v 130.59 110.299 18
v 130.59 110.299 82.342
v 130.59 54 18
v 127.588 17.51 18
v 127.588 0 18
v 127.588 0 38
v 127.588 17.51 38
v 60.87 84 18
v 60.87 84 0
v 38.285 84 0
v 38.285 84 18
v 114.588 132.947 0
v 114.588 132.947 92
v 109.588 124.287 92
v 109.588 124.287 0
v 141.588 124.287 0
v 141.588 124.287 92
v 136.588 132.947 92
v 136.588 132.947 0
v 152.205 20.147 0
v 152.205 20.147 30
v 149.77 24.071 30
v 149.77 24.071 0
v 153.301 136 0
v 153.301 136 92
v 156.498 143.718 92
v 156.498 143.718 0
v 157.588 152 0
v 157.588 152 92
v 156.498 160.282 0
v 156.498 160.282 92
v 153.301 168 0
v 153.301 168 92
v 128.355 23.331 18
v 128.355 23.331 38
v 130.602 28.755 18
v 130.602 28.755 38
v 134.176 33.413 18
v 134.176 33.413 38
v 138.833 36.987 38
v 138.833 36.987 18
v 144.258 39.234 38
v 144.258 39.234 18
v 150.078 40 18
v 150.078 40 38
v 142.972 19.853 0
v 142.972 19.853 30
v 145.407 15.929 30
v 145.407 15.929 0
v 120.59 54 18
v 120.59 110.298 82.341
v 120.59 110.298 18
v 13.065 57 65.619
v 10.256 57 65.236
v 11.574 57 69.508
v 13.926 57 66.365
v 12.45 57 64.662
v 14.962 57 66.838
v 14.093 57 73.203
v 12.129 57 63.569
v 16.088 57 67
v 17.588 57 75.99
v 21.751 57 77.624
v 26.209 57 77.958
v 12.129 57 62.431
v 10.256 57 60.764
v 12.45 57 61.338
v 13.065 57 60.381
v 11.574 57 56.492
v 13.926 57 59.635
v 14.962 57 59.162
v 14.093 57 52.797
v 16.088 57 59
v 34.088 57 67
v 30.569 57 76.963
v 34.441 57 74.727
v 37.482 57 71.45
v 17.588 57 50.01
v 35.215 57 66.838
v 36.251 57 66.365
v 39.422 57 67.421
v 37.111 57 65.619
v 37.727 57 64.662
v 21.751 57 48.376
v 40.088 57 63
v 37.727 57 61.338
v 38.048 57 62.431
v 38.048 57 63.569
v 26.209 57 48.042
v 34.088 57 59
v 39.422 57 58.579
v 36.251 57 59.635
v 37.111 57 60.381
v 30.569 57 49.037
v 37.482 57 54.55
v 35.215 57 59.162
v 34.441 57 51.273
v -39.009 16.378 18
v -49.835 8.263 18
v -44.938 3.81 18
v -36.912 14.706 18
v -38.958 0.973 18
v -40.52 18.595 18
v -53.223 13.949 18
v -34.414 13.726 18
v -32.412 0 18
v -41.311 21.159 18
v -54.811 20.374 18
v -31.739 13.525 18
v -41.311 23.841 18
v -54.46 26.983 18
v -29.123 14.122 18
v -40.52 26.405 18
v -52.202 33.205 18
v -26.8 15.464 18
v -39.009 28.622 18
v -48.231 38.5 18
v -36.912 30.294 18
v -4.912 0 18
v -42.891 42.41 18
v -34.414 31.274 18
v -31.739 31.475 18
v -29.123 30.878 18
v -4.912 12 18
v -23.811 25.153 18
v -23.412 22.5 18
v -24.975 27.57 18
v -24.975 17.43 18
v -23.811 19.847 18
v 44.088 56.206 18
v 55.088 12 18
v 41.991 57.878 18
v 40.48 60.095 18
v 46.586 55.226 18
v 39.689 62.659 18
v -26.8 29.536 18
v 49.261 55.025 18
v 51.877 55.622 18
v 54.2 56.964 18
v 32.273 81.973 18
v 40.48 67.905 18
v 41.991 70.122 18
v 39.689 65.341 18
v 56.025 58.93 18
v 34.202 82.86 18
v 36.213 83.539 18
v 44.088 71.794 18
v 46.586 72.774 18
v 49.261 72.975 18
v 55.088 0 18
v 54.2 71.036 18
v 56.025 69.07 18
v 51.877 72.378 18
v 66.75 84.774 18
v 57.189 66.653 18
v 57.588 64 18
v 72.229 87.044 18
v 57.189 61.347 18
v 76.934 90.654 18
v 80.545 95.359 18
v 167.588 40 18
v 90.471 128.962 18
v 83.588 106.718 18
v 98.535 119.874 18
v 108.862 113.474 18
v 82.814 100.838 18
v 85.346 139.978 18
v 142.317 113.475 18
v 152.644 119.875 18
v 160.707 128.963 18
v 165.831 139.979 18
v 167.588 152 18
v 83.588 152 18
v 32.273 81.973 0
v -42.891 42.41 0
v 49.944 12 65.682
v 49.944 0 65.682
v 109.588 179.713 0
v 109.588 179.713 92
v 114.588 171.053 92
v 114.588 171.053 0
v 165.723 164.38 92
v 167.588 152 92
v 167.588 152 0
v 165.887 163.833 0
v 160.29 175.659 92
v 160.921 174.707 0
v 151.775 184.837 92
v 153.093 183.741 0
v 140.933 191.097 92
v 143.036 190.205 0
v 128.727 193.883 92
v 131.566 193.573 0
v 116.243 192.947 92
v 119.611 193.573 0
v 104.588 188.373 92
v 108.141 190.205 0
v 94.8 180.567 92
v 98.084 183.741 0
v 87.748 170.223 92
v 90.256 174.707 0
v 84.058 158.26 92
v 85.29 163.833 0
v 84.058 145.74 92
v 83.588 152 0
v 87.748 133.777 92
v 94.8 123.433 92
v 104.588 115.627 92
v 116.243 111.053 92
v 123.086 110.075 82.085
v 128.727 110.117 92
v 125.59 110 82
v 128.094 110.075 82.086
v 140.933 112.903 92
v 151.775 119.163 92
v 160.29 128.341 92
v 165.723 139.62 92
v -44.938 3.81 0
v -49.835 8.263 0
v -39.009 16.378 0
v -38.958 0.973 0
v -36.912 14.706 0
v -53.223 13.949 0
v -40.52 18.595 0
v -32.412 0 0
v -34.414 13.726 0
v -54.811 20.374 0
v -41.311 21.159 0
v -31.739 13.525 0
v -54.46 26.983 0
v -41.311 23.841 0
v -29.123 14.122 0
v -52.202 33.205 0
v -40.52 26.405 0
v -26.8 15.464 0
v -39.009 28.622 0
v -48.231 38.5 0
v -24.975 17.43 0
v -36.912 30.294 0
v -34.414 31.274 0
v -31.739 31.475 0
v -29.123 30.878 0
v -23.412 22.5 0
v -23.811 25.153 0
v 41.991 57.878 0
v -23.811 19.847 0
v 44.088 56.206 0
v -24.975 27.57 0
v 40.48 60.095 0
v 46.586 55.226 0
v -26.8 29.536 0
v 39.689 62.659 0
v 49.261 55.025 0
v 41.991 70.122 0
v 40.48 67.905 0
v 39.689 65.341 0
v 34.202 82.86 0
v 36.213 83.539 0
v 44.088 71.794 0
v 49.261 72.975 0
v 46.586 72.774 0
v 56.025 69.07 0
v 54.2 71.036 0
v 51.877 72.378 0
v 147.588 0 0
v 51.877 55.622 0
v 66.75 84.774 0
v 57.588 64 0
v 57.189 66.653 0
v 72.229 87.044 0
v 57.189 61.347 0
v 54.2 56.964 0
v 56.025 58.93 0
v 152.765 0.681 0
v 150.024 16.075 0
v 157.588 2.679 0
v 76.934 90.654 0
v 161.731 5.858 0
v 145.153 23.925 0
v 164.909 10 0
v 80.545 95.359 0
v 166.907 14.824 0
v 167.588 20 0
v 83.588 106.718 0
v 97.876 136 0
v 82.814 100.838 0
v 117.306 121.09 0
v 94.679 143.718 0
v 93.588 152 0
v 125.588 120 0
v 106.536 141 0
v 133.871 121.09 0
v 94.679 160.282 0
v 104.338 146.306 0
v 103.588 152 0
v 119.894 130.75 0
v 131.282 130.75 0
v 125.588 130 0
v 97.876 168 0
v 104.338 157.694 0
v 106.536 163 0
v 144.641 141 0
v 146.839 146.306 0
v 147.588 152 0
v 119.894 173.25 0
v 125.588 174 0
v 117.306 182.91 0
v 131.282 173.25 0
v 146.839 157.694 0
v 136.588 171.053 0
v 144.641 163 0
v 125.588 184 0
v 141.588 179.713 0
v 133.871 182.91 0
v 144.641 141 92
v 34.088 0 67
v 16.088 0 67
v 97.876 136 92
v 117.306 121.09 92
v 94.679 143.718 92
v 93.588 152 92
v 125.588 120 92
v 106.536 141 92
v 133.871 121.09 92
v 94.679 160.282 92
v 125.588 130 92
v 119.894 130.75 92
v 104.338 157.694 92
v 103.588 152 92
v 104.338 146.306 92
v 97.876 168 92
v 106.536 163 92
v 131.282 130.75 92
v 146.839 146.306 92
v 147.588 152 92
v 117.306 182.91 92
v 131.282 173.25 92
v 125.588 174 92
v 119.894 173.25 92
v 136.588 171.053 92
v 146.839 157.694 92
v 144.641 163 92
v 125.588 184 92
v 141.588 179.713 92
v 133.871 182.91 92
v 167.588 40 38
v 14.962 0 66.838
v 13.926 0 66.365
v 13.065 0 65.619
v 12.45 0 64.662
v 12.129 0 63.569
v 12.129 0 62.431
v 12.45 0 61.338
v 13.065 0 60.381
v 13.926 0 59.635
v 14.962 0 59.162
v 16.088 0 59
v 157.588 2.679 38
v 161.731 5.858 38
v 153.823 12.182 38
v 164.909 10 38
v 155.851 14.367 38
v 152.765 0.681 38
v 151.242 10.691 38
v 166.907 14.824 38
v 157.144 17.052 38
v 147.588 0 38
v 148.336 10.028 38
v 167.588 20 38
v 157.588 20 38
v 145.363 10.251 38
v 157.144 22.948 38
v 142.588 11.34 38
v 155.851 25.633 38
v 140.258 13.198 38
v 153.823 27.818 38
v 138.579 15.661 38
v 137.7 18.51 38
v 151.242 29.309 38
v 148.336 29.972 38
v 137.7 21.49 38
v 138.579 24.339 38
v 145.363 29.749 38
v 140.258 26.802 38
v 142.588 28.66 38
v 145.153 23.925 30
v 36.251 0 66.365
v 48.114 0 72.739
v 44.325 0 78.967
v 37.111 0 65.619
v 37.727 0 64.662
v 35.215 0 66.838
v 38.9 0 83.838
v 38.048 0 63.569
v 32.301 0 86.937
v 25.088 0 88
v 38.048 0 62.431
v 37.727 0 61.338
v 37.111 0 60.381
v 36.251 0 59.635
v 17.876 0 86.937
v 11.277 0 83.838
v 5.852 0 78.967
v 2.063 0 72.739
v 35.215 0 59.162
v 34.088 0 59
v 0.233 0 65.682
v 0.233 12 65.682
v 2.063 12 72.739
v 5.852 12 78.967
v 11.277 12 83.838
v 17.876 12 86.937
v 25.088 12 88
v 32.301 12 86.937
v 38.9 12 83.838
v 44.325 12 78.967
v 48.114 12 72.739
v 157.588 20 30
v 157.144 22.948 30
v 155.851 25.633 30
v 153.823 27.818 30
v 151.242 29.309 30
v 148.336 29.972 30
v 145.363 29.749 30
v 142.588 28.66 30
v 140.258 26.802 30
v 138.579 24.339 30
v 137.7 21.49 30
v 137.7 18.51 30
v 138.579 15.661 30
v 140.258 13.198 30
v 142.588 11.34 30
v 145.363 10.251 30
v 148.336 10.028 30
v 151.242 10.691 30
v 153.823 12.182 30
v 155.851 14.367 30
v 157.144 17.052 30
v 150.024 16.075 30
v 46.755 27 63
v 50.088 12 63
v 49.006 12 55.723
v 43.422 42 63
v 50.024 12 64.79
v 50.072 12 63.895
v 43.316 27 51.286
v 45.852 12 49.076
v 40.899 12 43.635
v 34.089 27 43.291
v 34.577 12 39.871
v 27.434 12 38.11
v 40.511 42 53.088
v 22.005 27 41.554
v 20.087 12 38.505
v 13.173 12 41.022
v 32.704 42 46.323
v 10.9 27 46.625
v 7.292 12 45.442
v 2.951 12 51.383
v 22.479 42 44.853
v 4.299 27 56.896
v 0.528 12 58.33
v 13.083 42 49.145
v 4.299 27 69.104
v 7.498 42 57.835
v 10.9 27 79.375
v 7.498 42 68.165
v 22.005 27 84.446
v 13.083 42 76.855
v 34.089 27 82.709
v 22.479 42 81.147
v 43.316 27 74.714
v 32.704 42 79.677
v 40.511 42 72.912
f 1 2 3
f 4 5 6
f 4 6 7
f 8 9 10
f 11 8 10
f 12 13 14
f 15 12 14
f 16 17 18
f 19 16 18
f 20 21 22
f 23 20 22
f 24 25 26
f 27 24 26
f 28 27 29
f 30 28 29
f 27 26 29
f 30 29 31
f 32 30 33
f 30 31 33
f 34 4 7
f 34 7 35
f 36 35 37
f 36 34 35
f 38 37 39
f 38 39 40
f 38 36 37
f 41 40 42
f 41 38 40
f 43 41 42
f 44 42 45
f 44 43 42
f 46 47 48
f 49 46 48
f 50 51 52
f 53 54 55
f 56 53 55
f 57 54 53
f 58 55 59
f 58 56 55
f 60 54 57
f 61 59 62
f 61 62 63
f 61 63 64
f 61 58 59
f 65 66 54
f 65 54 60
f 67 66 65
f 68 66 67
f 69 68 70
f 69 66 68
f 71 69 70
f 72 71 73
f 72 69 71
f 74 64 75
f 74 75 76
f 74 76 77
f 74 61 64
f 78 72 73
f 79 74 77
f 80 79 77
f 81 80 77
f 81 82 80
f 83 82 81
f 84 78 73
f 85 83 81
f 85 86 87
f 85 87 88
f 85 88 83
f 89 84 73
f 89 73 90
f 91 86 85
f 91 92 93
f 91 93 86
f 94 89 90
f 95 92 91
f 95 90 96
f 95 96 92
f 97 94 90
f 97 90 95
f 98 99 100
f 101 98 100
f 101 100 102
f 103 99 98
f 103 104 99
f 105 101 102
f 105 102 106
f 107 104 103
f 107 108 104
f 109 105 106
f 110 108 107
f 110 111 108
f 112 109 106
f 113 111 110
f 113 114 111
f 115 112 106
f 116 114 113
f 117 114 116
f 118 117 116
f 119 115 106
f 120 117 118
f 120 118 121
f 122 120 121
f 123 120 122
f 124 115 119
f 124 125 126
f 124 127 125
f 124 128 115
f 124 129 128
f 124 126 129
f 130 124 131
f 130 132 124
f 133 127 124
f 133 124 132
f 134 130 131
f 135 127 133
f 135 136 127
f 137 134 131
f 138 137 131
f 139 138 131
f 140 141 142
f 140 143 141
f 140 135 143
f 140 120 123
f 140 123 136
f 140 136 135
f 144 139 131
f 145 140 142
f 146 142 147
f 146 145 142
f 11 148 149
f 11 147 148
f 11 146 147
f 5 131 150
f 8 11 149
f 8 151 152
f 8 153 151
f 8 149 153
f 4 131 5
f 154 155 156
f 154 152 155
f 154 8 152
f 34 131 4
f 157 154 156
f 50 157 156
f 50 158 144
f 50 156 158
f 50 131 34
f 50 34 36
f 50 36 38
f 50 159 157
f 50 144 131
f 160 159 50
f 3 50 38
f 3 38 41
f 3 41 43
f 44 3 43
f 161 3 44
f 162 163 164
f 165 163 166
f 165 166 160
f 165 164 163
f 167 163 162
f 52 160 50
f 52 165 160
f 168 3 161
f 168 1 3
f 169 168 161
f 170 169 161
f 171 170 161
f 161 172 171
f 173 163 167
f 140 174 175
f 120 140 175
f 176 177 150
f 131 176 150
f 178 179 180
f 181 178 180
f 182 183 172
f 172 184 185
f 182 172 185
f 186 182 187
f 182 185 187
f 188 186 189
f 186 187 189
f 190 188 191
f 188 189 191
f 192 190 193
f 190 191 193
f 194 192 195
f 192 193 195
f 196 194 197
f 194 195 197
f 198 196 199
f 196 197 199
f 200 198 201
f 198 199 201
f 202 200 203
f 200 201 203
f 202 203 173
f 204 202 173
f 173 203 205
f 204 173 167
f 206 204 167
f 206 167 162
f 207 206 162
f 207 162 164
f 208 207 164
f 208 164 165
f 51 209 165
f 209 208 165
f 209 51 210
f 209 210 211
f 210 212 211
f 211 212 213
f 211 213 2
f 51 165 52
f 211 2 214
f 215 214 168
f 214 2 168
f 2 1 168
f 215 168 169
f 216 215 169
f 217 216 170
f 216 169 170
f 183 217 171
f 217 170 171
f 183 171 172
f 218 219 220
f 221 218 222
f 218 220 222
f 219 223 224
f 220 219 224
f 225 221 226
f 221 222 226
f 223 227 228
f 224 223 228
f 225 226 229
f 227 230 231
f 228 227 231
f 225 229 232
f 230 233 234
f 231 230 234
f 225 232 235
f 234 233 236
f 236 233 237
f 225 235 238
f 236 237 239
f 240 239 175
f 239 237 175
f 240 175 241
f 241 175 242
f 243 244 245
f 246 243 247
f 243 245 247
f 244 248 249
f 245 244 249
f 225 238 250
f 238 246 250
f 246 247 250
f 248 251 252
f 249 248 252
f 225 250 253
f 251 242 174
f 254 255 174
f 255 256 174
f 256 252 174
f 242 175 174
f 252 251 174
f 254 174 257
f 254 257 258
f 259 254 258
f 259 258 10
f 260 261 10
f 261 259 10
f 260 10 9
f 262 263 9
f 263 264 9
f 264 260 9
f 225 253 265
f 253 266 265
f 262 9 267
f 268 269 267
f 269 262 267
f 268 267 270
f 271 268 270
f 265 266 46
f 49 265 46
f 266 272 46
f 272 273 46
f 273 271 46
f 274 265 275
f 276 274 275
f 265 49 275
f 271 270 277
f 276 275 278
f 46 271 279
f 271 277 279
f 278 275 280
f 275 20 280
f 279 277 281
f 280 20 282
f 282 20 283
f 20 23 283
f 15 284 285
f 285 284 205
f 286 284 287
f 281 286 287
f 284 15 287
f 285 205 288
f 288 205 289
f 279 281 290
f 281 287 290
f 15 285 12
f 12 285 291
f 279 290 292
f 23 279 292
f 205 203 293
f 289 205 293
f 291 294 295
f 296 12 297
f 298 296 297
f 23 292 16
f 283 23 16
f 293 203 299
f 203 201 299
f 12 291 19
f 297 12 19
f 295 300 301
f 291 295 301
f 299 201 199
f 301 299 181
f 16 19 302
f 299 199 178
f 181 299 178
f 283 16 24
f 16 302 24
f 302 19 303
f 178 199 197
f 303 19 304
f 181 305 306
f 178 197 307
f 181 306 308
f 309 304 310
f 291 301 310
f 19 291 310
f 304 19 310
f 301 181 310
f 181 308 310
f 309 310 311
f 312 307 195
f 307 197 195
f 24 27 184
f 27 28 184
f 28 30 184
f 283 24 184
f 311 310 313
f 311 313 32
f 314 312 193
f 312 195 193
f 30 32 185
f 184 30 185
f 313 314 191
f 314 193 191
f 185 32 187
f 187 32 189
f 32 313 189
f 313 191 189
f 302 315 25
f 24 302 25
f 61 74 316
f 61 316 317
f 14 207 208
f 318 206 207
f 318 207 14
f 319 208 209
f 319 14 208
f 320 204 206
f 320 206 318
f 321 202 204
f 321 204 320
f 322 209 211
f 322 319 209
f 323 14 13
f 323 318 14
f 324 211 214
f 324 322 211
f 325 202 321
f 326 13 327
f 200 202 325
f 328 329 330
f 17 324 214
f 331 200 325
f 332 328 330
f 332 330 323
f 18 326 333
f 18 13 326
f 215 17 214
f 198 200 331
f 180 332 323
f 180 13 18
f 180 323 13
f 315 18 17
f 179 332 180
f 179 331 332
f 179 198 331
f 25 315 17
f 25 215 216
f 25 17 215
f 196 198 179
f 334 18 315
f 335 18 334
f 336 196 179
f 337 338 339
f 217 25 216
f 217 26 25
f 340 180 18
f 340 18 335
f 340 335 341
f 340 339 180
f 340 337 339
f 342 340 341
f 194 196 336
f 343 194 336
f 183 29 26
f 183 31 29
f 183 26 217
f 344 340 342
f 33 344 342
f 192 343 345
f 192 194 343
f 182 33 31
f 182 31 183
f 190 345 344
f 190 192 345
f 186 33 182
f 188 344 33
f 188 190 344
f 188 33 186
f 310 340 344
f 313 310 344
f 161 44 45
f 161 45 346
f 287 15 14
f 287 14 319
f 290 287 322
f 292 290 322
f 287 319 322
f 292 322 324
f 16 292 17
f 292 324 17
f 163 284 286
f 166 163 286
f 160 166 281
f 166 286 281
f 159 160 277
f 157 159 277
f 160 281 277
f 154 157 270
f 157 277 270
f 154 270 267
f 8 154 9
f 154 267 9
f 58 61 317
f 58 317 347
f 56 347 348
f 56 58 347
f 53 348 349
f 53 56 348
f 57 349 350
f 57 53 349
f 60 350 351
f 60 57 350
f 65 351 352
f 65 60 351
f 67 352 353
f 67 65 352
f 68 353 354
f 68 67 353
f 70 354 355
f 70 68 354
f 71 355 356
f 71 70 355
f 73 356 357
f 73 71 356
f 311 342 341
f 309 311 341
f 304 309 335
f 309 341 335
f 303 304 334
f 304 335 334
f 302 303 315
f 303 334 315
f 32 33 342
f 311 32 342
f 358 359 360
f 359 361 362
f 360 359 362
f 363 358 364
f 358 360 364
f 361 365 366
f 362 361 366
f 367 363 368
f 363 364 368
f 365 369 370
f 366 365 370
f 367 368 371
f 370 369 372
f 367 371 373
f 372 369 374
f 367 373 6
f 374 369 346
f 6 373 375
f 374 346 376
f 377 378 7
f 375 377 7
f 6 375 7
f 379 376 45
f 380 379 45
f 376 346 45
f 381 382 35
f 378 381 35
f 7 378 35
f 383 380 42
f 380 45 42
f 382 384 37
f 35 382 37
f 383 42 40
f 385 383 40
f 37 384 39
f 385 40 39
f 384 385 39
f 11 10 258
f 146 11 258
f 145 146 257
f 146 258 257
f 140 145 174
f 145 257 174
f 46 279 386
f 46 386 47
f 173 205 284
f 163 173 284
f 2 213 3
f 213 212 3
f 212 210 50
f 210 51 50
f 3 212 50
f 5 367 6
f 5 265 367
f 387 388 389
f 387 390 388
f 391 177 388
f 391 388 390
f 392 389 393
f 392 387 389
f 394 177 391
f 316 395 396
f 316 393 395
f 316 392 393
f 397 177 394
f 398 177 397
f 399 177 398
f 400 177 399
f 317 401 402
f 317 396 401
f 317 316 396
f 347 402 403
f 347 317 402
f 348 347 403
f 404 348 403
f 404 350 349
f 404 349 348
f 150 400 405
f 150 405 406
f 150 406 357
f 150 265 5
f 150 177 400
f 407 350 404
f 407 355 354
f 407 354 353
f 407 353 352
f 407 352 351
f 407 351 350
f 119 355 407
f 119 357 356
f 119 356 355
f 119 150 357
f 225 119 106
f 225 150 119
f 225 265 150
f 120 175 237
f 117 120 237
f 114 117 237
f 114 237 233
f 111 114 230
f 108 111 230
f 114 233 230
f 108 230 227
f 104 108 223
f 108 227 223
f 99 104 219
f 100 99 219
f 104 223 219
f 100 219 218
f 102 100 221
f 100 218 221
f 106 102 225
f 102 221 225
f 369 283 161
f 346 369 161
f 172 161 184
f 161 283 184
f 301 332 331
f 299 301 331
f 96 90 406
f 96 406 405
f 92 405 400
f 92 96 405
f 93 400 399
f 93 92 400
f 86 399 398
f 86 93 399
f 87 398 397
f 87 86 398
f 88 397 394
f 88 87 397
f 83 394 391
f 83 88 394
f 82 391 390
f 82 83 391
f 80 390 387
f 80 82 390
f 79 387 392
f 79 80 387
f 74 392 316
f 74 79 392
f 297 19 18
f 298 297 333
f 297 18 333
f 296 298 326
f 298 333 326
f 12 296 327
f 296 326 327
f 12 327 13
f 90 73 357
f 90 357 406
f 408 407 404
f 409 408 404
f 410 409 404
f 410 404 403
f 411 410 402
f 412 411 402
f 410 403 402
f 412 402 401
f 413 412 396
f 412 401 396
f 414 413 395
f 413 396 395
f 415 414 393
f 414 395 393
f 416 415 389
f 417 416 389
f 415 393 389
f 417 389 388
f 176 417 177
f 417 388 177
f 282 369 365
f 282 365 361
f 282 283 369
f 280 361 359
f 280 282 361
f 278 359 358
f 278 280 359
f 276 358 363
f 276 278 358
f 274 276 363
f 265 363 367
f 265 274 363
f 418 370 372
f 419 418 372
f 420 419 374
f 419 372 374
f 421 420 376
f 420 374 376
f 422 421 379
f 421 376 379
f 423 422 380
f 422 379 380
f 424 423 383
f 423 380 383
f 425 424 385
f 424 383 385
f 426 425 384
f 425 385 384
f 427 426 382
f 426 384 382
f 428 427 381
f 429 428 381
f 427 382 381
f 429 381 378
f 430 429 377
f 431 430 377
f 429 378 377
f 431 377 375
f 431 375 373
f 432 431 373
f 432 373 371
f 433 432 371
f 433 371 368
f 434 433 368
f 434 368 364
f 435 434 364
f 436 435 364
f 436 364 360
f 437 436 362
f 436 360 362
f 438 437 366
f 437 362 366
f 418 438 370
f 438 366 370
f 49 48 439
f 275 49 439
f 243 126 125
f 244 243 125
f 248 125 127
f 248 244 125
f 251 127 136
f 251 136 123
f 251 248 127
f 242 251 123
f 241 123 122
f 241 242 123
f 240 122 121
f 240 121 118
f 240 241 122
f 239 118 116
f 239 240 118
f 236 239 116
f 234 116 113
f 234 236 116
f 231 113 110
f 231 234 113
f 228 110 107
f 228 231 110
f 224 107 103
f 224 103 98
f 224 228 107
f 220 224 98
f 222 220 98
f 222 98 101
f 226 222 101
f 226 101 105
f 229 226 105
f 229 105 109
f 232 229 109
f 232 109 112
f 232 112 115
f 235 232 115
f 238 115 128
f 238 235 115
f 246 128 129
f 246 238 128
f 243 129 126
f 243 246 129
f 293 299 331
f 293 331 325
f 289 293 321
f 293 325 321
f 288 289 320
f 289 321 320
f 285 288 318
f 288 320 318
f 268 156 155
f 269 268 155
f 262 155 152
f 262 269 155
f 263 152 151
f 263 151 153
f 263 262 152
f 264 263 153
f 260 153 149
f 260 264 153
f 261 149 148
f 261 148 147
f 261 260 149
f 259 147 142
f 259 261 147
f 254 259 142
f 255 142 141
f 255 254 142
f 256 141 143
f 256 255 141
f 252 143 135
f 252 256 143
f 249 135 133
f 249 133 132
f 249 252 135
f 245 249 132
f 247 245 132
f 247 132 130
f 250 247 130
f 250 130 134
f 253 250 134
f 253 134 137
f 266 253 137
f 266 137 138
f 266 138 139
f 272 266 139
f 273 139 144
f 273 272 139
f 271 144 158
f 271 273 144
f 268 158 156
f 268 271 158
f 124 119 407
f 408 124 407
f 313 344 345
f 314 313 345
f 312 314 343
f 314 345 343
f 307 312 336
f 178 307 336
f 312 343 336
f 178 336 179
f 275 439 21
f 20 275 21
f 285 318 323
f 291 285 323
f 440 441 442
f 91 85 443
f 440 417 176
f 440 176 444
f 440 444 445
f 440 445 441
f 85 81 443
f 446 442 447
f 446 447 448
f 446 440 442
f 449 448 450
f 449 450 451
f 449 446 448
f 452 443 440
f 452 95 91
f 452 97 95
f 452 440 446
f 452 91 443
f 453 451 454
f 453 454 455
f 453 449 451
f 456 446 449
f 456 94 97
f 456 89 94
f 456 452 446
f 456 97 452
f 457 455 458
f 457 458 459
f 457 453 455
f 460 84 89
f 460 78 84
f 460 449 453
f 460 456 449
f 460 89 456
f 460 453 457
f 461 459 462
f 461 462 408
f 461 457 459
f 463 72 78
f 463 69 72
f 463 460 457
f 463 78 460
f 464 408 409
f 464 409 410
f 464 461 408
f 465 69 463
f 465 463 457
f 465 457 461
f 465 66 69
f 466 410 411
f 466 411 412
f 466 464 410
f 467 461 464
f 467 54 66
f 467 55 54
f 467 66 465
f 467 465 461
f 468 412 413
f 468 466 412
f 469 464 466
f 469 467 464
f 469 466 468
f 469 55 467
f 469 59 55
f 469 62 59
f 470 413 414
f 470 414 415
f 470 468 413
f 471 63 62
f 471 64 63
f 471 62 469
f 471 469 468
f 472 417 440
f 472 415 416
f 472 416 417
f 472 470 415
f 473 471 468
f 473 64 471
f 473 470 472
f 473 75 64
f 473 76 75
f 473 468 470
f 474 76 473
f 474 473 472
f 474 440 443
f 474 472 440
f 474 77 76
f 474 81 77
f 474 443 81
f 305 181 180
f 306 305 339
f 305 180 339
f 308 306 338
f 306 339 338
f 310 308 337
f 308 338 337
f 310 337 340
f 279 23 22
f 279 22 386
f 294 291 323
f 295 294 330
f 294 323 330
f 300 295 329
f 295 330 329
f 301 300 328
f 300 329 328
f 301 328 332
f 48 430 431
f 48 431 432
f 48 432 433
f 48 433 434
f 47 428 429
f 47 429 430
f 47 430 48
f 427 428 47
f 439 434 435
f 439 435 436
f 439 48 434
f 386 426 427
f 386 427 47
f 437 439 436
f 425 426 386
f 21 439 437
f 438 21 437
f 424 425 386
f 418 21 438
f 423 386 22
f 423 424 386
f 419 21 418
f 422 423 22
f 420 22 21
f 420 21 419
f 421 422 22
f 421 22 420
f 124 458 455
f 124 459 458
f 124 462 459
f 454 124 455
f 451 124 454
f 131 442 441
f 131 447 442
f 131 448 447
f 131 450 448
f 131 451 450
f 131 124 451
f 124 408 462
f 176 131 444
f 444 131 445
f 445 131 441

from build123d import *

# Parameters (mm, degrees)
IZIM1_R                     = 9
Y_KSEKLIK_EKSTR_ZYON1_DEPTH = 18
IZIM2_R                     = 42
Y_KSEKLIK_EKSTR_ZYON2_DEPTH = 92
Y_KSEKLIK_EKSTR_ZYON3_DEPTH = 20
KES_EKSTR_ZYON1_DEPTH       = 60
KES_EKSTR_ZYON2_DEPTH       = 108
FEDER1_REACH                = 282.501
IZIM6_WALL_W                = 648.043161204
IZIM6_WALL_H                = 10
Y_KSEKLIK_EKSTR_ZYON4_DEPTH = 12
IZIM9_R                     = 25
IZIM8_R                     = 15
KES_EKSTR_ZYON3_DEPTH       = 65
IZIM11_R                    = 10
KES_EKSTR_ZYON4_DEPTH       = 8


with BuildPart() as part:
    # Çizim1 → Yükseklik-Ekstrüzyon1 (new body)
    with BuildSketch(Plane.XY):
        with BuildLine():
            Line((-32.411549897, 0), (147.588450103, 0))
            ThreePointArc((147.588450103, 0), (161.730585727, 5.857864376), (167.588450103, 20))
            Line((167.588450103, 20), (167.588450103, 152))
            ThreePointArc((167.588450103, 152), (125.588450103, 110), (83.588450103, 152))
            Line((83.588450103, 152), (83.588450103, 106.718465751))
            ThreePointArc((83.588450103, 106.718465751), (76.934365543, 90.65408456), (60.869984352, 84))
            Line((60.869984352, 84), (38.285308022, 84))
            ThreePointArc((38.285308022, 84), (35.198315251, 83.226334615), (32.273122012, 81.972808782))
            Line((32.273122012, 81.972808782), (-42.891293999, 42.41042349))
            ThreePointArc((-42.891293999, 42.41042349), (-54.25456398, 17.102525059), (-32.411549897, 0))
        make_face()
        with Locations((48.588450103, 64)):
            Circle(IZIM1_R, mode=Mode.SUBTRACT)
        with Locations((-32.411549897, 22.5)):
            Circle(IZIM1_R, mode=Mode.SUBTRACT)
    extrude(amount=Y_KSEKLIK_EKSTR_ZYON1_DEPTH)

    # Çizim2 → Yükseklik-Ekstrüzyon2 (add)
    with BuildSketch(Plane.XY):
        with Locations((125.588450103, 152)):
            Circle(IZIM2_R)
    extrude(amount=Y_KSEKLIK_EKSTR_ZYON2_DEPTH)

    # Çizim3 → Yükseklik-Ekstrüzyon3 (add)
    with BuildSketch(Plane.XY.offset(18)):
        with BuildLine():
            Line((127.588450103, 0), (127.588450103, 17.51012232))
            ThreePointArc((127.588450103, 17.51012232), (134.175582768, 33.412867336), (150.078327783, 40))
            Line((150.078327783, 40), (167.588450103, 40))
            Line((167.588450103, 40), (167.588450103, 20))
            ThreePointArc((167.588450103, 20), (161.730585727, 5.857864376), (147.588450103, 0))
            Line((147.588450103, 0), (127.588450103, 0))
        make_face()
    extrude(amount=Y_KSEKLIK_EKSTR_ZYON3_DEPTH)

    # Çizim4 → Kes-Ekstrüzyon1 (cut)
    with BuildSketch(Plane.XY.offset(38)):
        Polygon((145.407352826, 15.928618416), (150.023821345, 16.075423558), (152.204918622, 20.146805142), (149.76954738, 24.071381584), (145.153078862, 23.924576442), (142.971981585, 19.853194858), align=None)
    extrude(amount=-KES_EKSTR_ZYON1_DEPTH, mode=Mode.SUBTRACT)

    # Çizim5 → Kes-Ekstrüzyon2 (cut)
    with BuildSketch(Plane.XY.offset(92)):
        with BuildLine():
            Line((136.588450103, 171.052558883), (141.588450103, 179.712812921))
            ThreePointArc((141.588450103, 179.712812921), (125.588450103, 184), (109.588450103, 179.712812921))
            Line((109.588450103, 179.712812921), (114.588450103, 171.052558883))
            ThreePointArc((114.588450103, 171.052558883), (125.588450103, 174), (136.588450103, 171.052558883))
        make_face()
        with BuildLine():
            Line((144.641008987, 141), (153.301263025, 136))
            ThreePointArc((153.301263025, 136), (157.588450103, 152), (153.301263025, 168))
            Line((153.301263025, 168), (144.641008987, 163))
            ThreePointArc((144.641008987, 163), (147.588450103, 152), (144.641008987, 141))
        make_face()
        with BuildLine():
            Line((114.588450103, 132.947441117), (109.588450103, 124.287187079))
            ThreePointArc((109.588450103, 124.287187079), (125.588450103, 120), (141.588450103, 124.287187079))
            Line((141.588450103, 124.287187079), (136.588450103, 132.947441117))
            ThreePointArc((136.588450103, 132.947441117), (125.588450103, 130), (114.588450103, 132.947441117))
        make_face()
        with BuildLine():
            Line((106.53589122, 163), (97.875637182, 168))
            ThreePointArc((97.875637182, 168), (93.588450103, 152), (97.875637182, 136))
            Line((97.875637182, 136), (106.53589122, 141))
            ThreePointArc((106.53589122, 141), (103.588450103, 152), (106.53589122, 163))
        make_face()
    extrude(amount=-KES_EKSTR_ZYON2_DEPTH, mode=Mode.SUBTRACT)

    # Çizim6 wall → Feder1 (add, up to next)
    with BuildSketch(Plane(origin=(125.59, 82, 50), x_dir=(0, -0.658504607869, -0.752576694707), z_dir=(0, 0.752576694707, -0.658504607869)), mode=Mode.PRIVATE) as feder1_sk1:
        Rectangle(IZIM6_WALL_W, IZIM6_WALL_H)
    feder1_tool1 = extrude(feder1_sk1.sketch, amount=FEDER1_REACH, mode=Mode.PRIVATE) - part.part
    add(feder1_tool1.solids().sort_by_distance((125.59, 82, 50))[0])

    # Çizim7 → Yükseklik-Ekstrüzyon4 (add)
    with BuildSketch(Plane(origin=(0, 0, 0), x_dir=(1, 0, 0), z_dir=(0, 1, 0))):
        with BuildLine():
            Line((-4.911549897, -18), (0.232687834, -65.681619291))
            ThreePointArc((0.232687834, -65.681619291), (25.088450103, -88), (49.944212373, -65.681619291))
            Line((49.944212373, -65.681619291), (55.088450103, -18))
            Line((55.088450103, -18), (-4.911549897, -18))
        make_face()
    extrude(amount=Y_KSEKLIK_EKSTR_ZYON4_DEPTH)

    # Çizim9 → Loft1 section 0
    with BuildSketch(Plane(origin=(0, 12, 0), x_dir=(1, 0, 0), z_dir=(0, 1, 0))):
        with Locations((25.088450103, -63)):
            Circle(IZIM9_R)
    # Çizim8 → Loft1 section 1
    with BuildSketch(Plane(origin=(0, 57, 0), x_dir=(1, 0, 0), z_dir=(0, 1, 0))):
        with Locations((25.088450103, -63)):
            Circle(IZIM8_R)
    loft()

    # Çizim10 → Kes-Ekstrüzyon3 (cut)
    with BuildSketch(Plane(origin=(0, 57, 0), x_dir=(1, 0, 0), z_dir=(0, 1, 0))):
        with BuildLine():
            Line((16.088450103, -59), (34.088450103, -59))
            ThreePointArc((34.088450103, -59), (38.088450103, -63), (34.088450103, -67))
            Line((34.088450103, -67), (16.088450103, -67))
            ThreePointArc((16.088450103, -67), (12.088450103, -63), (16.088450103, -59))
        make_face()
    extrude(amount=-KES_EKSTR_ZYON3_DEPTH, mode=Mode.SUBTRACT)

    # Çizim11 → Kes-Ekstrüzyon4 (cut)
    with BuildSketch(Plane.XY.offset(38)):
        with Locations((147.588450103, 20)):
            Circle(IZIM11_R)
    extrude(amount=-KES_EKSTR_ZYON4_DEPTH, mode=Mode.SUBTRACT)


solid = part.part
